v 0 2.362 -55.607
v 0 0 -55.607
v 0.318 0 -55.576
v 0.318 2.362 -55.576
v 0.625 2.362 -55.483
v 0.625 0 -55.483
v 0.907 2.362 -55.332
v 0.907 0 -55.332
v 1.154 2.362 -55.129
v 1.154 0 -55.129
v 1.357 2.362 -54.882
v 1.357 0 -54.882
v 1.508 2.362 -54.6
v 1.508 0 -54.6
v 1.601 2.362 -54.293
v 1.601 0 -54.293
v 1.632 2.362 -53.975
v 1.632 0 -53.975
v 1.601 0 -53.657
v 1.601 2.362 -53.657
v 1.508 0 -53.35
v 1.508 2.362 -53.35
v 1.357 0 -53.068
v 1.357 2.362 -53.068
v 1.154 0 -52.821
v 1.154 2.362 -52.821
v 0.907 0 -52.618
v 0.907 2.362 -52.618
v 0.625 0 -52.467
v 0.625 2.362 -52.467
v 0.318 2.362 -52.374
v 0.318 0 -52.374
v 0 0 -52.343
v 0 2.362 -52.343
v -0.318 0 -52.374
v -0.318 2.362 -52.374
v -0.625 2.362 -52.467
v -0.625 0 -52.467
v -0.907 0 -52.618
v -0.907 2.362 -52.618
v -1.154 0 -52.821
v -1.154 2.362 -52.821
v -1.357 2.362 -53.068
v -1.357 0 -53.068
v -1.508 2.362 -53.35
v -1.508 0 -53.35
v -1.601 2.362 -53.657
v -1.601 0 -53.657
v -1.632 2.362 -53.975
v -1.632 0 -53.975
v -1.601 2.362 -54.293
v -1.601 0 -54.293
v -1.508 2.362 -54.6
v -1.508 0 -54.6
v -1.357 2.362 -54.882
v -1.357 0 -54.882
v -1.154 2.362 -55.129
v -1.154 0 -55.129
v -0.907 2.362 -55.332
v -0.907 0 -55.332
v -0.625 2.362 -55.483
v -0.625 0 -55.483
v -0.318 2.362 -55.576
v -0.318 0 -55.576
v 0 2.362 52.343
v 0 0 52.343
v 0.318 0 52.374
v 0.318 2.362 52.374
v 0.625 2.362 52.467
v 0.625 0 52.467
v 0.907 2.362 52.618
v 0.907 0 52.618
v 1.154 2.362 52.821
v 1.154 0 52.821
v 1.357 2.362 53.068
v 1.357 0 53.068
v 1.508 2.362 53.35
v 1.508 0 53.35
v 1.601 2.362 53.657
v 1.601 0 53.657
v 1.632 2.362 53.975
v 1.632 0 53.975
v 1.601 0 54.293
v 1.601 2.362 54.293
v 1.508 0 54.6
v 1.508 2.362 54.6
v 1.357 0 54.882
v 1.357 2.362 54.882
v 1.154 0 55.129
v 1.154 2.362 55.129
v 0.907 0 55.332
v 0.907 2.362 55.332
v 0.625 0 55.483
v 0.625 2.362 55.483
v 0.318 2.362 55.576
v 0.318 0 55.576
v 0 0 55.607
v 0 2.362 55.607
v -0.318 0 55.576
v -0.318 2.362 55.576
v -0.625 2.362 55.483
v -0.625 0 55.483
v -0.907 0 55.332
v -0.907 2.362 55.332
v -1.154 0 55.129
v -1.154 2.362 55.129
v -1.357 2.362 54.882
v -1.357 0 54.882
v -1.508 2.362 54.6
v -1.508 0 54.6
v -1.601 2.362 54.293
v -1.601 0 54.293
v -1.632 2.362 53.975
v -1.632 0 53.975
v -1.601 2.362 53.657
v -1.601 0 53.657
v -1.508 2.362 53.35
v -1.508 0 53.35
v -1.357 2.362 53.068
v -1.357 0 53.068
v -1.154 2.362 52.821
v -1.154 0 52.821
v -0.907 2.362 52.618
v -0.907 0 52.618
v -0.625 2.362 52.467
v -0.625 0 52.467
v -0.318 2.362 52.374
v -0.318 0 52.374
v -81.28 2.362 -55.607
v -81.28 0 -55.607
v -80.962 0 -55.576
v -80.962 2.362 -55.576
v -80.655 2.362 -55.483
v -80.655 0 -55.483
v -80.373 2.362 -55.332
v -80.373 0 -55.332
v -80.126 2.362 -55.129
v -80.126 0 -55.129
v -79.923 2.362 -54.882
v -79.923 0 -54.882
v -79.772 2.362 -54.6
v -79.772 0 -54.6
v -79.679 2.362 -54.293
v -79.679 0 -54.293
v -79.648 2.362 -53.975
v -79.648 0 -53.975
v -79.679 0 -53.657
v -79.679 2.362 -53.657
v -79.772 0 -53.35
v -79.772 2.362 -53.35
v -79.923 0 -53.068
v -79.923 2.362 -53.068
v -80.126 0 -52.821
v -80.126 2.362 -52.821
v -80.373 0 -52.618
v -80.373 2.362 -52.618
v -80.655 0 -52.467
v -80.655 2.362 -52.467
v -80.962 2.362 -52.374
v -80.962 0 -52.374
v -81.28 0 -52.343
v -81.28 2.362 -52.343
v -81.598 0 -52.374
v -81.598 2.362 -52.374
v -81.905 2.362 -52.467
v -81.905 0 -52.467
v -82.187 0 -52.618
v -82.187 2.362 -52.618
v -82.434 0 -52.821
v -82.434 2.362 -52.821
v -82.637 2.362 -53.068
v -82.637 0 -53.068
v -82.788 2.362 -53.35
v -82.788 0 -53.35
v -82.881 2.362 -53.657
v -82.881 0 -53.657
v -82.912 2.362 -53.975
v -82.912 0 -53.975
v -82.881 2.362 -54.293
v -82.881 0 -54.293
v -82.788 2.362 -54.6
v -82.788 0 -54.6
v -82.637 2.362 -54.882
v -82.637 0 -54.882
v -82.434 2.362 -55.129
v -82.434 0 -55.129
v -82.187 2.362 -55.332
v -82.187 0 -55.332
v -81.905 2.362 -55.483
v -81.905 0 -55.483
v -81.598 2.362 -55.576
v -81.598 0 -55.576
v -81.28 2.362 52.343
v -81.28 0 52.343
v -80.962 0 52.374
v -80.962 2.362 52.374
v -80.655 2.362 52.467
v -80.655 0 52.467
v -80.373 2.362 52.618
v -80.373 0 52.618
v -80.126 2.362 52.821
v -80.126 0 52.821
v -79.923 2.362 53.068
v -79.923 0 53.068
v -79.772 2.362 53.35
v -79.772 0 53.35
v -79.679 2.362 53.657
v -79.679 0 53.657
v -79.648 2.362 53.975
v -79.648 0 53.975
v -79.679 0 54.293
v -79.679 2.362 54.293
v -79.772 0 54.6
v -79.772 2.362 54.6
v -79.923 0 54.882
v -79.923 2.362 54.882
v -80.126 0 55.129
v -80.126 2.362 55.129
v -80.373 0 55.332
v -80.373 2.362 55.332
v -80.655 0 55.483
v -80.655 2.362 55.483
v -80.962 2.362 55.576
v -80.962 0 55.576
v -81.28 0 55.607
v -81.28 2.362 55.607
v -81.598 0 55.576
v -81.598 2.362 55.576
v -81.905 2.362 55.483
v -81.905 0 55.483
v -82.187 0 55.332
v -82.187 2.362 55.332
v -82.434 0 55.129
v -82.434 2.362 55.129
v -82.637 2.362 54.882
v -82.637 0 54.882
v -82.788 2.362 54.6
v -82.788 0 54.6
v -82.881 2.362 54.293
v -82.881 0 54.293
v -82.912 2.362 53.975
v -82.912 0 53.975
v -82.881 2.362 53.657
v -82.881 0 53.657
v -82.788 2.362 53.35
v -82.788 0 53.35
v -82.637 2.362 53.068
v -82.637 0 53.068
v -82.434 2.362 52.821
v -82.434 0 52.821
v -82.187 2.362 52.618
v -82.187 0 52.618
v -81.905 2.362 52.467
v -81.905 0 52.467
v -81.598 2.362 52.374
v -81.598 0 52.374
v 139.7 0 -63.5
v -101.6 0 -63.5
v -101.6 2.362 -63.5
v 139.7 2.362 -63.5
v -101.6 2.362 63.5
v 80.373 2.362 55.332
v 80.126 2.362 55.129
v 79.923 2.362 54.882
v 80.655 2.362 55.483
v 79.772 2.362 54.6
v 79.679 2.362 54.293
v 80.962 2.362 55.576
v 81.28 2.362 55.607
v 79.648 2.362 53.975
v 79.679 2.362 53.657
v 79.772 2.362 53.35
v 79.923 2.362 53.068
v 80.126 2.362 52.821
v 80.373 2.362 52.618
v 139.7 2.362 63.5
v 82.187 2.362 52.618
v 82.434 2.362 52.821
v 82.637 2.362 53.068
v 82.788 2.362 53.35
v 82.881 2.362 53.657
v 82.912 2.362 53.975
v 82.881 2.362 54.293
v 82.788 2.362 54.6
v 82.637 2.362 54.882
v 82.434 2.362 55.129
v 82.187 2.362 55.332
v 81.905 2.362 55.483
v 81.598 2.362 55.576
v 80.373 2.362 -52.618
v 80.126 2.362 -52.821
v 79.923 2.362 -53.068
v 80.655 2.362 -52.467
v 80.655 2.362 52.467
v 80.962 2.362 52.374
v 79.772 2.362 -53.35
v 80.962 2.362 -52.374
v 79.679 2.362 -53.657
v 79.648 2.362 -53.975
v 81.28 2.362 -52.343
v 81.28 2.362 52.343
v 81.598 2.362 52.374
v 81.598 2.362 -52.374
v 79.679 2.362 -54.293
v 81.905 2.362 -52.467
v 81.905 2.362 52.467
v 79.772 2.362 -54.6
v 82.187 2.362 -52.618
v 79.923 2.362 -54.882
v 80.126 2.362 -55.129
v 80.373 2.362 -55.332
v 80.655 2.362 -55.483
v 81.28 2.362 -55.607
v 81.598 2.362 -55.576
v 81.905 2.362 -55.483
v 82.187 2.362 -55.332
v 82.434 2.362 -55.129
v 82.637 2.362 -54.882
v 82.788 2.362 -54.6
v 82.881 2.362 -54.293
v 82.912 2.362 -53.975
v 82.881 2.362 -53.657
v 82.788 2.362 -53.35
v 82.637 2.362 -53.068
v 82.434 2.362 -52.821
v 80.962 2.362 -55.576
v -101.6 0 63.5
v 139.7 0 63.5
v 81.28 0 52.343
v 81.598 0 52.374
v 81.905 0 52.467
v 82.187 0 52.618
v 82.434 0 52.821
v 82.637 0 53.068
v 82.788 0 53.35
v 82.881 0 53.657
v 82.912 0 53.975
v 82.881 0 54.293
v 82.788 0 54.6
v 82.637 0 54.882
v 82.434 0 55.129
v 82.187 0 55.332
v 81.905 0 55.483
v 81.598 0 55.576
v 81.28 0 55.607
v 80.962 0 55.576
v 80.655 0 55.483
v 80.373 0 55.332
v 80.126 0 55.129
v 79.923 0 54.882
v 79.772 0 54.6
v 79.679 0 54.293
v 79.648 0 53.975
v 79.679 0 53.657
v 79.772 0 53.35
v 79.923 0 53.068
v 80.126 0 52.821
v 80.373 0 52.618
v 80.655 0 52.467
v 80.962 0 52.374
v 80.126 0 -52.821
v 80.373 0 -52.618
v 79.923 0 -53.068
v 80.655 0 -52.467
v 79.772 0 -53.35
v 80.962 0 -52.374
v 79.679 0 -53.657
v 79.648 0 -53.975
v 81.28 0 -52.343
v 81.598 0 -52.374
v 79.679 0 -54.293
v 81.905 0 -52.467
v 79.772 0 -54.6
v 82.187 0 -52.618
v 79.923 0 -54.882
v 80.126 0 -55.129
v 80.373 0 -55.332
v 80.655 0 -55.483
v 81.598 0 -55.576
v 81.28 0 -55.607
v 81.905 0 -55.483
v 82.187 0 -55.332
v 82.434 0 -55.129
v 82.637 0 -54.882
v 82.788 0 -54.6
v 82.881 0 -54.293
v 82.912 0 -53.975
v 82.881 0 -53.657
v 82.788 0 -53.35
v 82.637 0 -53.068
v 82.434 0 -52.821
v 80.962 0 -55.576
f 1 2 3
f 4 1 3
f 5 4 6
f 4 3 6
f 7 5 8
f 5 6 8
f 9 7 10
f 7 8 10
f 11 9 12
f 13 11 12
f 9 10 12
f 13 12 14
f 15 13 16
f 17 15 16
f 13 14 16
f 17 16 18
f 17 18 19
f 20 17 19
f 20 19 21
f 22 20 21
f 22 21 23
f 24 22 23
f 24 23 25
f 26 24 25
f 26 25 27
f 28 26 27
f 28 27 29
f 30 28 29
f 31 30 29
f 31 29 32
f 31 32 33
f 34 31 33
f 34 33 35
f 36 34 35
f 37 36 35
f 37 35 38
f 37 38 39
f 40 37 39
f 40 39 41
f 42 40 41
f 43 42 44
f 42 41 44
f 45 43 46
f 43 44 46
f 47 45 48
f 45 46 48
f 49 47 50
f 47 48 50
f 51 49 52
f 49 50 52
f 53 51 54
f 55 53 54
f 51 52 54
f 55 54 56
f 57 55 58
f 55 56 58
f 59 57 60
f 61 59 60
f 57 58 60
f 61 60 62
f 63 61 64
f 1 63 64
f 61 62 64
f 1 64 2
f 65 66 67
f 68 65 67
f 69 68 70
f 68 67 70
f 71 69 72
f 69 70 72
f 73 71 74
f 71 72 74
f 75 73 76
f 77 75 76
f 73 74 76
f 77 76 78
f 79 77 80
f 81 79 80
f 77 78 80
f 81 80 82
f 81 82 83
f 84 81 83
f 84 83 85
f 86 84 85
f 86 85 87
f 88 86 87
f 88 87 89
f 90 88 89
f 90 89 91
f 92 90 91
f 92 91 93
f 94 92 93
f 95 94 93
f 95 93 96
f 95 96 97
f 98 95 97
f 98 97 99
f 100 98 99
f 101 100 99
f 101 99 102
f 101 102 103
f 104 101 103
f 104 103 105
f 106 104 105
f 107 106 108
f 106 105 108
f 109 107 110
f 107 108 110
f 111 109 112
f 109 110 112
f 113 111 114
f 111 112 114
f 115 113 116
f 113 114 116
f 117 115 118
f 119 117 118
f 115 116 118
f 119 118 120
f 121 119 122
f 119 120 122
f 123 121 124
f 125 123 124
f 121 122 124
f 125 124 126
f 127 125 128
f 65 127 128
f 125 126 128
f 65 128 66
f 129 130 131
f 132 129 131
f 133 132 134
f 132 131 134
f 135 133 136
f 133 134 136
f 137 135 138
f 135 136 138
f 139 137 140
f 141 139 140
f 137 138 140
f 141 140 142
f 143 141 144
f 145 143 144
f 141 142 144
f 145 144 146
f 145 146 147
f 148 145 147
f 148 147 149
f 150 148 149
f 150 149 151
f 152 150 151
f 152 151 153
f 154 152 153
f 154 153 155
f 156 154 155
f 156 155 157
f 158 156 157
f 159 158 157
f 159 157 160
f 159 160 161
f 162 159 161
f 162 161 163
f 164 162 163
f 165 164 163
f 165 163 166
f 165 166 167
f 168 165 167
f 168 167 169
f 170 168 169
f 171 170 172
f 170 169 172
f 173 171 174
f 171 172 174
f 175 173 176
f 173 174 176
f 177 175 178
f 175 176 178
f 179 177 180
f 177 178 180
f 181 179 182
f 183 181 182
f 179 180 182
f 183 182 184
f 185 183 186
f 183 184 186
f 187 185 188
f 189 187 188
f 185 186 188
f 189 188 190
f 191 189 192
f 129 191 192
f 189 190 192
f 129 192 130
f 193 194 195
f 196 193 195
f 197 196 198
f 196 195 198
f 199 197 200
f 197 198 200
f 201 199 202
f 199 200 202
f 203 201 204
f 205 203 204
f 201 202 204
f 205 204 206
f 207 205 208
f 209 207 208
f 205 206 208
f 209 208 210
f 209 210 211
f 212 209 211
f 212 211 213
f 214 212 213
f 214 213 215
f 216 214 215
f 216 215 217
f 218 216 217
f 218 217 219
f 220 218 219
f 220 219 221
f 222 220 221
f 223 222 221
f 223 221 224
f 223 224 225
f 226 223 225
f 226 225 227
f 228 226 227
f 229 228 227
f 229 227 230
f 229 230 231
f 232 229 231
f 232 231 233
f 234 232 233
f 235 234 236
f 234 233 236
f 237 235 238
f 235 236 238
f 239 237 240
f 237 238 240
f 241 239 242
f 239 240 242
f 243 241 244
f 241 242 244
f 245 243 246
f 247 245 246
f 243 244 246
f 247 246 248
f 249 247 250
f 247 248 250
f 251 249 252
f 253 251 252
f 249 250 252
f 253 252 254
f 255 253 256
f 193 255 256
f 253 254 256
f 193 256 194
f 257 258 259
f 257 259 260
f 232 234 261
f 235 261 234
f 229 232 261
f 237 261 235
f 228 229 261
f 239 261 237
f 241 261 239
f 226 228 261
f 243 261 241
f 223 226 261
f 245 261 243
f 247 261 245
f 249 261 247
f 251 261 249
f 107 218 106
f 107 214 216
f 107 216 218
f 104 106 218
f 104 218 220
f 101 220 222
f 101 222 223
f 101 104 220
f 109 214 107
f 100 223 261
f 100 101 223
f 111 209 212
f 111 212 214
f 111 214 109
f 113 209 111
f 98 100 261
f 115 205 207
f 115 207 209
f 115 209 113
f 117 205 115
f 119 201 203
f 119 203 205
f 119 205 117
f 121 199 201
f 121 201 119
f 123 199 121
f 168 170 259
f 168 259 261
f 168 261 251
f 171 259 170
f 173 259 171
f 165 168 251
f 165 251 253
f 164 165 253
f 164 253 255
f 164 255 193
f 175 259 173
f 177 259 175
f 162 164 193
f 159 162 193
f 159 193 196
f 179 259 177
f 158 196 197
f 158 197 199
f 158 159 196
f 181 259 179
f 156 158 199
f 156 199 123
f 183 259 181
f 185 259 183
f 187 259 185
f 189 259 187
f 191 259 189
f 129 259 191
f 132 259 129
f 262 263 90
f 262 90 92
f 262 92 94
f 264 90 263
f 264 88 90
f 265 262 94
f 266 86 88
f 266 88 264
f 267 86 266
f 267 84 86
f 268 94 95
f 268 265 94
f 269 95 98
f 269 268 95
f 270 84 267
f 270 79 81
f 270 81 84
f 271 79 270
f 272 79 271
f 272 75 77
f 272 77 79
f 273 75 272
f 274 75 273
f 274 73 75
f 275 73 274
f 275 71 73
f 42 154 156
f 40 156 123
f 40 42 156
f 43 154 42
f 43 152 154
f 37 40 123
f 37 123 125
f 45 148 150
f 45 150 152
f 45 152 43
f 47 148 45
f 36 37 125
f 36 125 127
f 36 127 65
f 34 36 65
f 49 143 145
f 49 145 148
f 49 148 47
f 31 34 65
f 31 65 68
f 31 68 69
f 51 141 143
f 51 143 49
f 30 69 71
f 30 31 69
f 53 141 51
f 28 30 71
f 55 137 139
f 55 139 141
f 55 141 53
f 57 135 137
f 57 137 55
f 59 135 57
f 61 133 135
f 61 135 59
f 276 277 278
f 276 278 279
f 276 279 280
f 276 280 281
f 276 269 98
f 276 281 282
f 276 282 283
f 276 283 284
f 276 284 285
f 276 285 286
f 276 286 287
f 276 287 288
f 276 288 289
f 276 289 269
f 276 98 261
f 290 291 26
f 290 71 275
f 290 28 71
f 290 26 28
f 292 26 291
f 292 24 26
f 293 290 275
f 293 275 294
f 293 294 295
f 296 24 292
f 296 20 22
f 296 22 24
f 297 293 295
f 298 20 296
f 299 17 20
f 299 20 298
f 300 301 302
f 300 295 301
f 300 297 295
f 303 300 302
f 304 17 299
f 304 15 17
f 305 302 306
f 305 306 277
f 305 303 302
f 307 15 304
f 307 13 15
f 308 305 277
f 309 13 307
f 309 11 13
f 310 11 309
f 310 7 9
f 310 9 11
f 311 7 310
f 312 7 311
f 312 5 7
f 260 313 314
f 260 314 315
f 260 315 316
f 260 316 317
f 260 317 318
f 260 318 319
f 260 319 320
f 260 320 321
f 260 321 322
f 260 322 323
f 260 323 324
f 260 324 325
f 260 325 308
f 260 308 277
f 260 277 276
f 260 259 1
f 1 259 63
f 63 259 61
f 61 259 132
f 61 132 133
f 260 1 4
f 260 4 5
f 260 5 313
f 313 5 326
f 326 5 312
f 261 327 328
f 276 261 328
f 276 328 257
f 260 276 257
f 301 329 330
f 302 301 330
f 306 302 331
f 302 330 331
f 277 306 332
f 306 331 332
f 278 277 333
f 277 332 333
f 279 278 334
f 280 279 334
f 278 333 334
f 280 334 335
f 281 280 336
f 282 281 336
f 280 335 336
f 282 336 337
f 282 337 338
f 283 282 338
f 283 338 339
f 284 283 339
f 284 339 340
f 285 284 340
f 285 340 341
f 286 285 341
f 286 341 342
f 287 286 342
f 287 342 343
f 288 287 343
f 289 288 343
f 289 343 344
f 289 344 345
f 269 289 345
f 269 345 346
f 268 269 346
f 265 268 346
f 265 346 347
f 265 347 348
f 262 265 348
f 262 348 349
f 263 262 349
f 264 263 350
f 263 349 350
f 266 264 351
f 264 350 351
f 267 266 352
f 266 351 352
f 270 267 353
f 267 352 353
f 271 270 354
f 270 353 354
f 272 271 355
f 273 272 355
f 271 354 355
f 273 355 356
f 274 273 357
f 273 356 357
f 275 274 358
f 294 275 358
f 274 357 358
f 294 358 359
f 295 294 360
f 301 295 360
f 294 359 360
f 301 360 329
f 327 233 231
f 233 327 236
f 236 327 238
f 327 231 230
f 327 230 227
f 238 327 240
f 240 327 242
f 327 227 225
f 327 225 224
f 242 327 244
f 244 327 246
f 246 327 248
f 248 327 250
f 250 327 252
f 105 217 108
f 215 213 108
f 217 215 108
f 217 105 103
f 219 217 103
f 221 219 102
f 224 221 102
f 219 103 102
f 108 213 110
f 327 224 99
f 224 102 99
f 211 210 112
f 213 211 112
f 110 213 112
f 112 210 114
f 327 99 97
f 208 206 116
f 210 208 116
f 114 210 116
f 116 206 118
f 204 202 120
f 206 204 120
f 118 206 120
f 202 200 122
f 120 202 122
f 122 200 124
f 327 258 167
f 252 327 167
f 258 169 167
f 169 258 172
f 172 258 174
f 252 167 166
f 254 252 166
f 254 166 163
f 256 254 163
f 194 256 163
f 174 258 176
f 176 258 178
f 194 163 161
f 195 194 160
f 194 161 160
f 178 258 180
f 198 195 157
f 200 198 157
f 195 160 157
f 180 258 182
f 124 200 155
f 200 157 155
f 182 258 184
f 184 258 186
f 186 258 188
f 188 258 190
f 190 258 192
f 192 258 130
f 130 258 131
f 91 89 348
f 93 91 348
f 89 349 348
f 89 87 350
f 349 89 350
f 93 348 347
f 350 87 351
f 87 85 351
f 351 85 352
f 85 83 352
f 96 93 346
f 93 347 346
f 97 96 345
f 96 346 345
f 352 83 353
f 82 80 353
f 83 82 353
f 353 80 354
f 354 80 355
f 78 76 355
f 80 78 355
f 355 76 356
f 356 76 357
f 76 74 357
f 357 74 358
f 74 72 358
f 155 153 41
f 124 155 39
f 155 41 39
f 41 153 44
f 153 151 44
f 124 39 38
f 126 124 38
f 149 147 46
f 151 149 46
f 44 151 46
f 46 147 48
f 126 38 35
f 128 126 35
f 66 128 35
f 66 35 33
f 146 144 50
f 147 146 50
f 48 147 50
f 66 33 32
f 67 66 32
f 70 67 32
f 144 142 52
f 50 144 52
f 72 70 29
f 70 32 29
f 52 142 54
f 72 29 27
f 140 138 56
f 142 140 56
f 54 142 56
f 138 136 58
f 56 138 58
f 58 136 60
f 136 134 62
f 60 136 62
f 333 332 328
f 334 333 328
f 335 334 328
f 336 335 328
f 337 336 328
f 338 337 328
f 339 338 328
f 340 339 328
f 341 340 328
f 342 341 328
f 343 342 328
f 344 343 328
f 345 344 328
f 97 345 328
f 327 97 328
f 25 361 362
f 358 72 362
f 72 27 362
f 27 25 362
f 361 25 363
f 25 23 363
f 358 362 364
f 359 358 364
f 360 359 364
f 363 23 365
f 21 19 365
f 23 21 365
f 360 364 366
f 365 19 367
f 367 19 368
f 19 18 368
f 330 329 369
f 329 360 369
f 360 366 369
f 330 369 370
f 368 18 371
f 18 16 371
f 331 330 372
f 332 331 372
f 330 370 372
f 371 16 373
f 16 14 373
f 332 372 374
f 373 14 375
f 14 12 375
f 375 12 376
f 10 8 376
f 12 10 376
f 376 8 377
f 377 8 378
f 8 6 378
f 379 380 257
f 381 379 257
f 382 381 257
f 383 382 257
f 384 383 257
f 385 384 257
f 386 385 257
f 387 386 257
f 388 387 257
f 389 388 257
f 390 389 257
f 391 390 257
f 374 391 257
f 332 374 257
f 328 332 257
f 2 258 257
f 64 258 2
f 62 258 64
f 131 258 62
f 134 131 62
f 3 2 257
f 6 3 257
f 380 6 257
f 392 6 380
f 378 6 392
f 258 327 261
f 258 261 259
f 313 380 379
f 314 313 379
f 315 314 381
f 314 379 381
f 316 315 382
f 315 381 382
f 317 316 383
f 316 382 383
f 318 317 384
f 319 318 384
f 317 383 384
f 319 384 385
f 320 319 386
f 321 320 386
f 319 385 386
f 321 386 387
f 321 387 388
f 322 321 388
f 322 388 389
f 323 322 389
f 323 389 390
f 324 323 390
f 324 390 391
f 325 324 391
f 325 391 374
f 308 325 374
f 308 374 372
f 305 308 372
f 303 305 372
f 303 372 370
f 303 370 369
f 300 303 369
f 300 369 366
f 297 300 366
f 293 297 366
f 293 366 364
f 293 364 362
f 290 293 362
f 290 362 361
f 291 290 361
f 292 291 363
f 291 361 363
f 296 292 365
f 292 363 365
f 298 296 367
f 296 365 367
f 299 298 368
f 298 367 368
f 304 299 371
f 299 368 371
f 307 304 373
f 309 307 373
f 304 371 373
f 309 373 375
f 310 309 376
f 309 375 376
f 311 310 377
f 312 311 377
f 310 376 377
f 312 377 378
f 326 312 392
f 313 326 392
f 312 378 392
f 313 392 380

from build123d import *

# Parameters (mm, degrees)
SKETCH1_W                 = 203.2
SKETCH1_H                 = 127
EXTRUDE1_DEPTH            = 2.3622
F_4_CLEARANCE_HOLE1_D     = 3.2639
F_4_CLEARANCE_HOLE1_DEPTH = 6.35
F_4_CLEARANCE_HOLE1_TIP   = 0.980574487
SKETCH3_W                 = 38.1
SKETCH3_H                 = 127
EXTRUDE2_DEPTH            = 2.3622


with BuildPart() as part:
    # Sketch1 → Extrude1 (new body)
    with BuildSketch(Plane(origin=(0, 0, 0), x_dir=(1, 0, 0), z_dir=(0, 1, 0))):
        Rectangle(SKETCH1_W, SKETCH1_H)
    extrude(amount=EXTRUDE1_DEPTH)

    # #4 Clearance Hole1
    with Locations(Plane(origin=(-81.28, 2.3622, -53.975), x_dir=(0, 0, 1), z_dir=(0, 1, 0))):
        with Locations((0, 0), (0, 81.28), (107.95, 81.28), (107.95, 0), (107.95, 162.56), (0, 162.56)):
            Hole(F_4_CLEARANCE_HOLE1_D / 2, depth=F_4_CLEARANCE_HOLE1_DEPTH)
            with Locations((0, 0, -(F_4_CLEARANCE_HOLE1_DEPTH + F_4_CLEARANCE_HOLE1_TIP / 2))):  # 118° drill point
                Cone(0, F_4_CLEARANCE_HOLE1_D / 2, F_4_CLEARANCE_HOLE1_TIP, mode=Mode.SUBTRACT)

    # Sketch3 → Extrude2 (add)
    with BuildSketch(Plane(origin=(0, 0, 0), x_dir=(1, 0, 0), z_dir=(0, 1, 0))):
        with Locations((120.65, 0)):
            Rectangle(SKETCH3_W, SKETCH3_H)
    extrude(amount=EXTRUDE2_DEPTH)


solid = part.part
